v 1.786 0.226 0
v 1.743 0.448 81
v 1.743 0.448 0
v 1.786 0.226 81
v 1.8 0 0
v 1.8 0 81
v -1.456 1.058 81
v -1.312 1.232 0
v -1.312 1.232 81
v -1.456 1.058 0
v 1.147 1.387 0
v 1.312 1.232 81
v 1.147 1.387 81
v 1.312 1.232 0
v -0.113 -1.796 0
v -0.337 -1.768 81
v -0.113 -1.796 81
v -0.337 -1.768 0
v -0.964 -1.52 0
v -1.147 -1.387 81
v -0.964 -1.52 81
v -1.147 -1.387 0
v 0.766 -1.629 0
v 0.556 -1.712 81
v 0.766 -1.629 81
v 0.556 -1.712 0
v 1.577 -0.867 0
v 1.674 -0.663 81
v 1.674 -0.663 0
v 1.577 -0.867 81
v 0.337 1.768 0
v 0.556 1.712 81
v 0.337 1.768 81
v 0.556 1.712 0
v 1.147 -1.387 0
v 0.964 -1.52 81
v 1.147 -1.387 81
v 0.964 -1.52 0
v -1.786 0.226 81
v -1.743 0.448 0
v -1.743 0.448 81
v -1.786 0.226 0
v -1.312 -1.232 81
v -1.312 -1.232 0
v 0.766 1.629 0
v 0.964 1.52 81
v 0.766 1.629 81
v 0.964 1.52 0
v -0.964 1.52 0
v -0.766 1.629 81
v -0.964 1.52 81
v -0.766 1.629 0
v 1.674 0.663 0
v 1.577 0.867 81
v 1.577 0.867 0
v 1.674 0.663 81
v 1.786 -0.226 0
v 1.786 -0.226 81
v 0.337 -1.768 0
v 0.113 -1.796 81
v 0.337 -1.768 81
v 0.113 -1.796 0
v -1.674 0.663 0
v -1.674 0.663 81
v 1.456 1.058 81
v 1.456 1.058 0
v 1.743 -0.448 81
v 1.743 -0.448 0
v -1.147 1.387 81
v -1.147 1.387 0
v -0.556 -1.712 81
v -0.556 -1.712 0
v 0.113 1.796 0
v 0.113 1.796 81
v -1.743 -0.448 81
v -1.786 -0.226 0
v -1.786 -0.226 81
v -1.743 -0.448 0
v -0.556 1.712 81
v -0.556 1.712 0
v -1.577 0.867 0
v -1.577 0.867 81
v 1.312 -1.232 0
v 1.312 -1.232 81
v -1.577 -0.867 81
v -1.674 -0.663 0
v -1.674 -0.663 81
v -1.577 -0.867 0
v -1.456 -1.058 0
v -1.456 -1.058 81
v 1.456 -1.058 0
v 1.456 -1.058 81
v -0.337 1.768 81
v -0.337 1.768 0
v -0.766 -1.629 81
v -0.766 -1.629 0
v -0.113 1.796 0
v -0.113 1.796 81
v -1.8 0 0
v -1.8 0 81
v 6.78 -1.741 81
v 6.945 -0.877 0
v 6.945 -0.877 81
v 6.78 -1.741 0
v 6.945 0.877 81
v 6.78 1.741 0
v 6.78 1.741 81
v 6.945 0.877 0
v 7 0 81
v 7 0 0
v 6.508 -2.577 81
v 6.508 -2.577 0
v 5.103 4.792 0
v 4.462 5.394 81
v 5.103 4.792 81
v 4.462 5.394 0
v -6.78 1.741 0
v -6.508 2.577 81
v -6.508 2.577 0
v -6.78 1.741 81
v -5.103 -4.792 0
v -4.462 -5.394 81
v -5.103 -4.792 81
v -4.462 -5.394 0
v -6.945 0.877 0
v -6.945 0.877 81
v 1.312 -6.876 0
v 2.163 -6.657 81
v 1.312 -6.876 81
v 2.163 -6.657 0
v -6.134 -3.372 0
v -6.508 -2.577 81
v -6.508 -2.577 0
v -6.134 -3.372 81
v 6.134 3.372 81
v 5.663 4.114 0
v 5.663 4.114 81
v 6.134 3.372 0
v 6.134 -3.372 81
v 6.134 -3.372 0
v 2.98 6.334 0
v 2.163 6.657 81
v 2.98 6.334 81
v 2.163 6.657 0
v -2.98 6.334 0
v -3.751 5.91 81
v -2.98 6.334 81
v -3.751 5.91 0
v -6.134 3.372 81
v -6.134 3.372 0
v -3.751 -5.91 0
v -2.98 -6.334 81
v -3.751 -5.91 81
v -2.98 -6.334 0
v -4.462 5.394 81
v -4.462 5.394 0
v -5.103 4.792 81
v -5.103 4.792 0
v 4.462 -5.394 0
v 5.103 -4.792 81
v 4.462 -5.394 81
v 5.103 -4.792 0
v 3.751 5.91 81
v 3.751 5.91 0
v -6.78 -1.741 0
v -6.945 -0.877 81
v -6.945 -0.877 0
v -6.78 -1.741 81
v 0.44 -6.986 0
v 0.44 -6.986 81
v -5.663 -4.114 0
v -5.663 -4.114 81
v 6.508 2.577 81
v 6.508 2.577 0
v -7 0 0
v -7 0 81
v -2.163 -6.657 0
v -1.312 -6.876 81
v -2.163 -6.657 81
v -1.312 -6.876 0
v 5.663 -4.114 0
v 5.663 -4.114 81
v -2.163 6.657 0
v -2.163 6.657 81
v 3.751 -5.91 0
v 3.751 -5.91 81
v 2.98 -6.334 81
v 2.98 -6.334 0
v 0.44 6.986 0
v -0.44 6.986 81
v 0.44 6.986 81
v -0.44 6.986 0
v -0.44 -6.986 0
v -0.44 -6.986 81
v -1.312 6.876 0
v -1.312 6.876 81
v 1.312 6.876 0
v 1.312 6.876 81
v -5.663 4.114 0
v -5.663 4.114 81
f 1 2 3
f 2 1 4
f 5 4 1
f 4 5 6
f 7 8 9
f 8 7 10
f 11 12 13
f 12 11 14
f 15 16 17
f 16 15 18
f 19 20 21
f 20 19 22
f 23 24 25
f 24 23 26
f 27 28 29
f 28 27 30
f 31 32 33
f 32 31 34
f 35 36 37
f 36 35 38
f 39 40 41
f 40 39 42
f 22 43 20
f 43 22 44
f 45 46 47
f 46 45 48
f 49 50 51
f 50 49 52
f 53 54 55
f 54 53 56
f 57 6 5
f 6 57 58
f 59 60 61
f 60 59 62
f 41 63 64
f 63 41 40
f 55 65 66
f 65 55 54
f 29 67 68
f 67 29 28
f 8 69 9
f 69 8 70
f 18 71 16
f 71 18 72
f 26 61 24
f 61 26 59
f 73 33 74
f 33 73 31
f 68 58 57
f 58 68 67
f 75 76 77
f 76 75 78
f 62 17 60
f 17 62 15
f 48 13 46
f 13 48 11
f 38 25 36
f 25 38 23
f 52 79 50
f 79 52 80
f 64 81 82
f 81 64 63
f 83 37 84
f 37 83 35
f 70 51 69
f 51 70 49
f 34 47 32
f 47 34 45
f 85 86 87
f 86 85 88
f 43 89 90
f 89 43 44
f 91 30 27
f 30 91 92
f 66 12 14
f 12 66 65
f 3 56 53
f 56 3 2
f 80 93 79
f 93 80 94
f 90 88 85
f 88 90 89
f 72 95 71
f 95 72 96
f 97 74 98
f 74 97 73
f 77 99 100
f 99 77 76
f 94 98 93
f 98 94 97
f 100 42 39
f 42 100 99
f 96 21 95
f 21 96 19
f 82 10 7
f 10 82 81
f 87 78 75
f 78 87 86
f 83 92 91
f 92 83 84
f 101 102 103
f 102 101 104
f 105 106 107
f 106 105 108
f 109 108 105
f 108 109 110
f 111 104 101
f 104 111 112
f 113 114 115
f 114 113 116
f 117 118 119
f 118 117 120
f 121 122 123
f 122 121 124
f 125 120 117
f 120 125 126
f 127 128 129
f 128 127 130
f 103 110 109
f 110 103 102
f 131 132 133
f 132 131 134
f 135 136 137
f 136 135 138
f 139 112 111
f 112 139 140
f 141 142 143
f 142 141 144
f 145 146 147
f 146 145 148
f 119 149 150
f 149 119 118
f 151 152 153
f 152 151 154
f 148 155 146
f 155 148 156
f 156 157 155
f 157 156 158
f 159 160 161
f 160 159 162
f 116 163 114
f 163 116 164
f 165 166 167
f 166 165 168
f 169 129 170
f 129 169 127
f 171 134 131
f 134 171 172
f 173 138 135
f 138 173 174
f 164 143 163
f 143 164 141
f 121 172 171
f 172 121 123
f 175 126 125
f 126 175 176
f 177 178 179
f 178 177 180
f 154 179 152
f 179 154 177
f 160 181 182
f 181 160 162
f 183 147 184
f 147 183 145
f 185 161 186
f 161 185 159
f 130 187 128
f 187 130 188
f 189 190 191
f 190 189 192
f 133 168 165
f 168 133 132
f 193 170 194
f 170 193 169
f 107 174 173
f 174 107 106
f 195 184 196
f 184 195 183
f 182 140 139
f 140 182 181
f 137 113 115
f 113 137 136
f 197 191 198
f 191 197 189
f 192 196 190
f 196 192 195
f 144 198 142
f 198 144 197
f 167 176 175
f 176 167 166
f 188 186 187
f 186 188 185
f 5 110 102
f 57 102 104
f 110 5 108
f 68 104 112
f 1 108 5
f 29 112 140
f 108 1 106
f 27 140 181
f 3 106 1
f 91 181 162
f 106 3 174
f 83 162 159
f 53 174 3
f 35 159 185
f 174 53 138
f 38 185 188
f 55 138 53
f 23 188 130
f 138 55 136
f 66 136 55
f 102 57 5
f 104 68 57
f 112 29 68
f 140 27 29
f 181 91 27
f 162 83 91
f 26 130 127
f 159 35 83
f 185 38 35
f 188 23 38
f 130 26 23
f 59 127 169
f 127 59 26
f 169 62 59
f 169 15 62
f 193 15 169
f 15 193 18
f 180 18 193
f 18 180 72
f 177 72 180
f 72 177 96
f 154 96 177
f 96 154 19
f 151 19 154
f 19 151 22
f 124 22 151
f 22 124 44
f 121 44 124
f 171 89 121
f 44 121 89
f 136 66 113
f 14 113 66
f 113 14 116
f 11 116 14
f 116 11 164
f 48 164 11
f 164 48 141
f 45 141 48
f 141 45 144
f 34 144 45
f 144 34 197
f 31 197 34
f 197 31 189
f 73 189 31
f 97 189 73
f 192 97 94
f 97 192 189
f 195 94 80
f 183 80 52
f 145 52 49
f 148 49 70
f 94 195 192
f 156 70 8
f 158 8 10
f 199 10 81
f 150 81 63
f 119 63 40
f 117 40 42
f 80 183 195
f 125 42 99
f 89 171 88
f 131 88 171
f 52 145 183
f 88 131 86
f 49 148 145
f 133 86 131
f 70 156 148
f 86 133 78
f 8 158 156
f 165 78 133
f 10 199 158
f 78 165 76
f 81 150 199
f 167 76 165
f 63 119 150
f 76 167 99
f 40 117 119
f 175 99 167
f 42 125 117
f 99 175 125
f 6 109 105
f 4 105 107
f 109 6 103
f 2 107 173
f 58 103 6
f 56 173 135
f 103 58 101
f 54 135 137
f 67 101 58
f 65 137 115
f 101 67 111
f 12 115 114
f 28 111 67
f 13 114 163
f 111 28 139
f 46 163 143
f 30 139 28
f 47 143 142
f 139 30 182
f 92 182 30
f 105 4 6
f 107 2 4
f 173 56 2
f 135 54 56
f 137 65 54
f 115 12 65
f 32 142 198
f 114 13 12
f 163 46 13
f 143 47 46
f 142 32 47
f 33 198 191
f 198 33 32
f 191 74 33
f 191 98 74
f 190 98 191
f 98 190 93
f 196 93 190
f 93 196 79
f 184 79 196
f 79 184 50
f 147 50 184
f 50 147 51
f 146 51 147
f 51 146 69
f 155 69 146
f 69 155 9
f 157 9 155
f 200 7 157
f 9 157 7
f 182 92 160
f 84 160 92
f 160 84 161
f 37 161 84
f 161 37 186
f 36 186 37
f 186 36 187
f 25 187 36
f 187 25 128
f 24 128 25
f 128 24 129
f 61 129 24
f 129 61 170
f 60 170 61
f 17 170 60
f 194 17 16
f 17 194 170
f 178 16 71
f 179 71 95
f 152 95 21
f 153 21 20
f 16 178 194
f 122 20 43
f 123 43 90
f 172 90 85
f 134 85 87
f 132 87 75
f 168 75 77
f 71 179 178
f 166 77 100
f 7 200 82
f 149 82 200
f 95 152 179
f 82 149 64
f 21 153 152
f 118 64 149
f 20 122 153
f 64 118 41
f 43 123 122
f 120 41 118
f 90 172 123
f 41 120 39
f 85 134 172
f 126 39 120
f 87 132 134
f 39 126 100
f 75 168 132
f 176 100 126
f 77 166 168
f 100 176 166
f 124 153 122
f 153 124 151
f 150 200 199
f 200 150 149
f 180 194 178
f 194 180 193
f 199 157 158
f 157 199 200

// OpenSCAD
$fn = 50;


difference() {
	union() {
		cylinder(h = 81, r = 7.0000000000);
	}
	union() {
		translate(v = [0, 0, -100]) {
			cylinder(h = 200, r = 1.8000000000);
		}
		translate(v = [0, 0, -100]) {
			cylinder(h = 200, r = 1.8000000000);
		}
	}
}
